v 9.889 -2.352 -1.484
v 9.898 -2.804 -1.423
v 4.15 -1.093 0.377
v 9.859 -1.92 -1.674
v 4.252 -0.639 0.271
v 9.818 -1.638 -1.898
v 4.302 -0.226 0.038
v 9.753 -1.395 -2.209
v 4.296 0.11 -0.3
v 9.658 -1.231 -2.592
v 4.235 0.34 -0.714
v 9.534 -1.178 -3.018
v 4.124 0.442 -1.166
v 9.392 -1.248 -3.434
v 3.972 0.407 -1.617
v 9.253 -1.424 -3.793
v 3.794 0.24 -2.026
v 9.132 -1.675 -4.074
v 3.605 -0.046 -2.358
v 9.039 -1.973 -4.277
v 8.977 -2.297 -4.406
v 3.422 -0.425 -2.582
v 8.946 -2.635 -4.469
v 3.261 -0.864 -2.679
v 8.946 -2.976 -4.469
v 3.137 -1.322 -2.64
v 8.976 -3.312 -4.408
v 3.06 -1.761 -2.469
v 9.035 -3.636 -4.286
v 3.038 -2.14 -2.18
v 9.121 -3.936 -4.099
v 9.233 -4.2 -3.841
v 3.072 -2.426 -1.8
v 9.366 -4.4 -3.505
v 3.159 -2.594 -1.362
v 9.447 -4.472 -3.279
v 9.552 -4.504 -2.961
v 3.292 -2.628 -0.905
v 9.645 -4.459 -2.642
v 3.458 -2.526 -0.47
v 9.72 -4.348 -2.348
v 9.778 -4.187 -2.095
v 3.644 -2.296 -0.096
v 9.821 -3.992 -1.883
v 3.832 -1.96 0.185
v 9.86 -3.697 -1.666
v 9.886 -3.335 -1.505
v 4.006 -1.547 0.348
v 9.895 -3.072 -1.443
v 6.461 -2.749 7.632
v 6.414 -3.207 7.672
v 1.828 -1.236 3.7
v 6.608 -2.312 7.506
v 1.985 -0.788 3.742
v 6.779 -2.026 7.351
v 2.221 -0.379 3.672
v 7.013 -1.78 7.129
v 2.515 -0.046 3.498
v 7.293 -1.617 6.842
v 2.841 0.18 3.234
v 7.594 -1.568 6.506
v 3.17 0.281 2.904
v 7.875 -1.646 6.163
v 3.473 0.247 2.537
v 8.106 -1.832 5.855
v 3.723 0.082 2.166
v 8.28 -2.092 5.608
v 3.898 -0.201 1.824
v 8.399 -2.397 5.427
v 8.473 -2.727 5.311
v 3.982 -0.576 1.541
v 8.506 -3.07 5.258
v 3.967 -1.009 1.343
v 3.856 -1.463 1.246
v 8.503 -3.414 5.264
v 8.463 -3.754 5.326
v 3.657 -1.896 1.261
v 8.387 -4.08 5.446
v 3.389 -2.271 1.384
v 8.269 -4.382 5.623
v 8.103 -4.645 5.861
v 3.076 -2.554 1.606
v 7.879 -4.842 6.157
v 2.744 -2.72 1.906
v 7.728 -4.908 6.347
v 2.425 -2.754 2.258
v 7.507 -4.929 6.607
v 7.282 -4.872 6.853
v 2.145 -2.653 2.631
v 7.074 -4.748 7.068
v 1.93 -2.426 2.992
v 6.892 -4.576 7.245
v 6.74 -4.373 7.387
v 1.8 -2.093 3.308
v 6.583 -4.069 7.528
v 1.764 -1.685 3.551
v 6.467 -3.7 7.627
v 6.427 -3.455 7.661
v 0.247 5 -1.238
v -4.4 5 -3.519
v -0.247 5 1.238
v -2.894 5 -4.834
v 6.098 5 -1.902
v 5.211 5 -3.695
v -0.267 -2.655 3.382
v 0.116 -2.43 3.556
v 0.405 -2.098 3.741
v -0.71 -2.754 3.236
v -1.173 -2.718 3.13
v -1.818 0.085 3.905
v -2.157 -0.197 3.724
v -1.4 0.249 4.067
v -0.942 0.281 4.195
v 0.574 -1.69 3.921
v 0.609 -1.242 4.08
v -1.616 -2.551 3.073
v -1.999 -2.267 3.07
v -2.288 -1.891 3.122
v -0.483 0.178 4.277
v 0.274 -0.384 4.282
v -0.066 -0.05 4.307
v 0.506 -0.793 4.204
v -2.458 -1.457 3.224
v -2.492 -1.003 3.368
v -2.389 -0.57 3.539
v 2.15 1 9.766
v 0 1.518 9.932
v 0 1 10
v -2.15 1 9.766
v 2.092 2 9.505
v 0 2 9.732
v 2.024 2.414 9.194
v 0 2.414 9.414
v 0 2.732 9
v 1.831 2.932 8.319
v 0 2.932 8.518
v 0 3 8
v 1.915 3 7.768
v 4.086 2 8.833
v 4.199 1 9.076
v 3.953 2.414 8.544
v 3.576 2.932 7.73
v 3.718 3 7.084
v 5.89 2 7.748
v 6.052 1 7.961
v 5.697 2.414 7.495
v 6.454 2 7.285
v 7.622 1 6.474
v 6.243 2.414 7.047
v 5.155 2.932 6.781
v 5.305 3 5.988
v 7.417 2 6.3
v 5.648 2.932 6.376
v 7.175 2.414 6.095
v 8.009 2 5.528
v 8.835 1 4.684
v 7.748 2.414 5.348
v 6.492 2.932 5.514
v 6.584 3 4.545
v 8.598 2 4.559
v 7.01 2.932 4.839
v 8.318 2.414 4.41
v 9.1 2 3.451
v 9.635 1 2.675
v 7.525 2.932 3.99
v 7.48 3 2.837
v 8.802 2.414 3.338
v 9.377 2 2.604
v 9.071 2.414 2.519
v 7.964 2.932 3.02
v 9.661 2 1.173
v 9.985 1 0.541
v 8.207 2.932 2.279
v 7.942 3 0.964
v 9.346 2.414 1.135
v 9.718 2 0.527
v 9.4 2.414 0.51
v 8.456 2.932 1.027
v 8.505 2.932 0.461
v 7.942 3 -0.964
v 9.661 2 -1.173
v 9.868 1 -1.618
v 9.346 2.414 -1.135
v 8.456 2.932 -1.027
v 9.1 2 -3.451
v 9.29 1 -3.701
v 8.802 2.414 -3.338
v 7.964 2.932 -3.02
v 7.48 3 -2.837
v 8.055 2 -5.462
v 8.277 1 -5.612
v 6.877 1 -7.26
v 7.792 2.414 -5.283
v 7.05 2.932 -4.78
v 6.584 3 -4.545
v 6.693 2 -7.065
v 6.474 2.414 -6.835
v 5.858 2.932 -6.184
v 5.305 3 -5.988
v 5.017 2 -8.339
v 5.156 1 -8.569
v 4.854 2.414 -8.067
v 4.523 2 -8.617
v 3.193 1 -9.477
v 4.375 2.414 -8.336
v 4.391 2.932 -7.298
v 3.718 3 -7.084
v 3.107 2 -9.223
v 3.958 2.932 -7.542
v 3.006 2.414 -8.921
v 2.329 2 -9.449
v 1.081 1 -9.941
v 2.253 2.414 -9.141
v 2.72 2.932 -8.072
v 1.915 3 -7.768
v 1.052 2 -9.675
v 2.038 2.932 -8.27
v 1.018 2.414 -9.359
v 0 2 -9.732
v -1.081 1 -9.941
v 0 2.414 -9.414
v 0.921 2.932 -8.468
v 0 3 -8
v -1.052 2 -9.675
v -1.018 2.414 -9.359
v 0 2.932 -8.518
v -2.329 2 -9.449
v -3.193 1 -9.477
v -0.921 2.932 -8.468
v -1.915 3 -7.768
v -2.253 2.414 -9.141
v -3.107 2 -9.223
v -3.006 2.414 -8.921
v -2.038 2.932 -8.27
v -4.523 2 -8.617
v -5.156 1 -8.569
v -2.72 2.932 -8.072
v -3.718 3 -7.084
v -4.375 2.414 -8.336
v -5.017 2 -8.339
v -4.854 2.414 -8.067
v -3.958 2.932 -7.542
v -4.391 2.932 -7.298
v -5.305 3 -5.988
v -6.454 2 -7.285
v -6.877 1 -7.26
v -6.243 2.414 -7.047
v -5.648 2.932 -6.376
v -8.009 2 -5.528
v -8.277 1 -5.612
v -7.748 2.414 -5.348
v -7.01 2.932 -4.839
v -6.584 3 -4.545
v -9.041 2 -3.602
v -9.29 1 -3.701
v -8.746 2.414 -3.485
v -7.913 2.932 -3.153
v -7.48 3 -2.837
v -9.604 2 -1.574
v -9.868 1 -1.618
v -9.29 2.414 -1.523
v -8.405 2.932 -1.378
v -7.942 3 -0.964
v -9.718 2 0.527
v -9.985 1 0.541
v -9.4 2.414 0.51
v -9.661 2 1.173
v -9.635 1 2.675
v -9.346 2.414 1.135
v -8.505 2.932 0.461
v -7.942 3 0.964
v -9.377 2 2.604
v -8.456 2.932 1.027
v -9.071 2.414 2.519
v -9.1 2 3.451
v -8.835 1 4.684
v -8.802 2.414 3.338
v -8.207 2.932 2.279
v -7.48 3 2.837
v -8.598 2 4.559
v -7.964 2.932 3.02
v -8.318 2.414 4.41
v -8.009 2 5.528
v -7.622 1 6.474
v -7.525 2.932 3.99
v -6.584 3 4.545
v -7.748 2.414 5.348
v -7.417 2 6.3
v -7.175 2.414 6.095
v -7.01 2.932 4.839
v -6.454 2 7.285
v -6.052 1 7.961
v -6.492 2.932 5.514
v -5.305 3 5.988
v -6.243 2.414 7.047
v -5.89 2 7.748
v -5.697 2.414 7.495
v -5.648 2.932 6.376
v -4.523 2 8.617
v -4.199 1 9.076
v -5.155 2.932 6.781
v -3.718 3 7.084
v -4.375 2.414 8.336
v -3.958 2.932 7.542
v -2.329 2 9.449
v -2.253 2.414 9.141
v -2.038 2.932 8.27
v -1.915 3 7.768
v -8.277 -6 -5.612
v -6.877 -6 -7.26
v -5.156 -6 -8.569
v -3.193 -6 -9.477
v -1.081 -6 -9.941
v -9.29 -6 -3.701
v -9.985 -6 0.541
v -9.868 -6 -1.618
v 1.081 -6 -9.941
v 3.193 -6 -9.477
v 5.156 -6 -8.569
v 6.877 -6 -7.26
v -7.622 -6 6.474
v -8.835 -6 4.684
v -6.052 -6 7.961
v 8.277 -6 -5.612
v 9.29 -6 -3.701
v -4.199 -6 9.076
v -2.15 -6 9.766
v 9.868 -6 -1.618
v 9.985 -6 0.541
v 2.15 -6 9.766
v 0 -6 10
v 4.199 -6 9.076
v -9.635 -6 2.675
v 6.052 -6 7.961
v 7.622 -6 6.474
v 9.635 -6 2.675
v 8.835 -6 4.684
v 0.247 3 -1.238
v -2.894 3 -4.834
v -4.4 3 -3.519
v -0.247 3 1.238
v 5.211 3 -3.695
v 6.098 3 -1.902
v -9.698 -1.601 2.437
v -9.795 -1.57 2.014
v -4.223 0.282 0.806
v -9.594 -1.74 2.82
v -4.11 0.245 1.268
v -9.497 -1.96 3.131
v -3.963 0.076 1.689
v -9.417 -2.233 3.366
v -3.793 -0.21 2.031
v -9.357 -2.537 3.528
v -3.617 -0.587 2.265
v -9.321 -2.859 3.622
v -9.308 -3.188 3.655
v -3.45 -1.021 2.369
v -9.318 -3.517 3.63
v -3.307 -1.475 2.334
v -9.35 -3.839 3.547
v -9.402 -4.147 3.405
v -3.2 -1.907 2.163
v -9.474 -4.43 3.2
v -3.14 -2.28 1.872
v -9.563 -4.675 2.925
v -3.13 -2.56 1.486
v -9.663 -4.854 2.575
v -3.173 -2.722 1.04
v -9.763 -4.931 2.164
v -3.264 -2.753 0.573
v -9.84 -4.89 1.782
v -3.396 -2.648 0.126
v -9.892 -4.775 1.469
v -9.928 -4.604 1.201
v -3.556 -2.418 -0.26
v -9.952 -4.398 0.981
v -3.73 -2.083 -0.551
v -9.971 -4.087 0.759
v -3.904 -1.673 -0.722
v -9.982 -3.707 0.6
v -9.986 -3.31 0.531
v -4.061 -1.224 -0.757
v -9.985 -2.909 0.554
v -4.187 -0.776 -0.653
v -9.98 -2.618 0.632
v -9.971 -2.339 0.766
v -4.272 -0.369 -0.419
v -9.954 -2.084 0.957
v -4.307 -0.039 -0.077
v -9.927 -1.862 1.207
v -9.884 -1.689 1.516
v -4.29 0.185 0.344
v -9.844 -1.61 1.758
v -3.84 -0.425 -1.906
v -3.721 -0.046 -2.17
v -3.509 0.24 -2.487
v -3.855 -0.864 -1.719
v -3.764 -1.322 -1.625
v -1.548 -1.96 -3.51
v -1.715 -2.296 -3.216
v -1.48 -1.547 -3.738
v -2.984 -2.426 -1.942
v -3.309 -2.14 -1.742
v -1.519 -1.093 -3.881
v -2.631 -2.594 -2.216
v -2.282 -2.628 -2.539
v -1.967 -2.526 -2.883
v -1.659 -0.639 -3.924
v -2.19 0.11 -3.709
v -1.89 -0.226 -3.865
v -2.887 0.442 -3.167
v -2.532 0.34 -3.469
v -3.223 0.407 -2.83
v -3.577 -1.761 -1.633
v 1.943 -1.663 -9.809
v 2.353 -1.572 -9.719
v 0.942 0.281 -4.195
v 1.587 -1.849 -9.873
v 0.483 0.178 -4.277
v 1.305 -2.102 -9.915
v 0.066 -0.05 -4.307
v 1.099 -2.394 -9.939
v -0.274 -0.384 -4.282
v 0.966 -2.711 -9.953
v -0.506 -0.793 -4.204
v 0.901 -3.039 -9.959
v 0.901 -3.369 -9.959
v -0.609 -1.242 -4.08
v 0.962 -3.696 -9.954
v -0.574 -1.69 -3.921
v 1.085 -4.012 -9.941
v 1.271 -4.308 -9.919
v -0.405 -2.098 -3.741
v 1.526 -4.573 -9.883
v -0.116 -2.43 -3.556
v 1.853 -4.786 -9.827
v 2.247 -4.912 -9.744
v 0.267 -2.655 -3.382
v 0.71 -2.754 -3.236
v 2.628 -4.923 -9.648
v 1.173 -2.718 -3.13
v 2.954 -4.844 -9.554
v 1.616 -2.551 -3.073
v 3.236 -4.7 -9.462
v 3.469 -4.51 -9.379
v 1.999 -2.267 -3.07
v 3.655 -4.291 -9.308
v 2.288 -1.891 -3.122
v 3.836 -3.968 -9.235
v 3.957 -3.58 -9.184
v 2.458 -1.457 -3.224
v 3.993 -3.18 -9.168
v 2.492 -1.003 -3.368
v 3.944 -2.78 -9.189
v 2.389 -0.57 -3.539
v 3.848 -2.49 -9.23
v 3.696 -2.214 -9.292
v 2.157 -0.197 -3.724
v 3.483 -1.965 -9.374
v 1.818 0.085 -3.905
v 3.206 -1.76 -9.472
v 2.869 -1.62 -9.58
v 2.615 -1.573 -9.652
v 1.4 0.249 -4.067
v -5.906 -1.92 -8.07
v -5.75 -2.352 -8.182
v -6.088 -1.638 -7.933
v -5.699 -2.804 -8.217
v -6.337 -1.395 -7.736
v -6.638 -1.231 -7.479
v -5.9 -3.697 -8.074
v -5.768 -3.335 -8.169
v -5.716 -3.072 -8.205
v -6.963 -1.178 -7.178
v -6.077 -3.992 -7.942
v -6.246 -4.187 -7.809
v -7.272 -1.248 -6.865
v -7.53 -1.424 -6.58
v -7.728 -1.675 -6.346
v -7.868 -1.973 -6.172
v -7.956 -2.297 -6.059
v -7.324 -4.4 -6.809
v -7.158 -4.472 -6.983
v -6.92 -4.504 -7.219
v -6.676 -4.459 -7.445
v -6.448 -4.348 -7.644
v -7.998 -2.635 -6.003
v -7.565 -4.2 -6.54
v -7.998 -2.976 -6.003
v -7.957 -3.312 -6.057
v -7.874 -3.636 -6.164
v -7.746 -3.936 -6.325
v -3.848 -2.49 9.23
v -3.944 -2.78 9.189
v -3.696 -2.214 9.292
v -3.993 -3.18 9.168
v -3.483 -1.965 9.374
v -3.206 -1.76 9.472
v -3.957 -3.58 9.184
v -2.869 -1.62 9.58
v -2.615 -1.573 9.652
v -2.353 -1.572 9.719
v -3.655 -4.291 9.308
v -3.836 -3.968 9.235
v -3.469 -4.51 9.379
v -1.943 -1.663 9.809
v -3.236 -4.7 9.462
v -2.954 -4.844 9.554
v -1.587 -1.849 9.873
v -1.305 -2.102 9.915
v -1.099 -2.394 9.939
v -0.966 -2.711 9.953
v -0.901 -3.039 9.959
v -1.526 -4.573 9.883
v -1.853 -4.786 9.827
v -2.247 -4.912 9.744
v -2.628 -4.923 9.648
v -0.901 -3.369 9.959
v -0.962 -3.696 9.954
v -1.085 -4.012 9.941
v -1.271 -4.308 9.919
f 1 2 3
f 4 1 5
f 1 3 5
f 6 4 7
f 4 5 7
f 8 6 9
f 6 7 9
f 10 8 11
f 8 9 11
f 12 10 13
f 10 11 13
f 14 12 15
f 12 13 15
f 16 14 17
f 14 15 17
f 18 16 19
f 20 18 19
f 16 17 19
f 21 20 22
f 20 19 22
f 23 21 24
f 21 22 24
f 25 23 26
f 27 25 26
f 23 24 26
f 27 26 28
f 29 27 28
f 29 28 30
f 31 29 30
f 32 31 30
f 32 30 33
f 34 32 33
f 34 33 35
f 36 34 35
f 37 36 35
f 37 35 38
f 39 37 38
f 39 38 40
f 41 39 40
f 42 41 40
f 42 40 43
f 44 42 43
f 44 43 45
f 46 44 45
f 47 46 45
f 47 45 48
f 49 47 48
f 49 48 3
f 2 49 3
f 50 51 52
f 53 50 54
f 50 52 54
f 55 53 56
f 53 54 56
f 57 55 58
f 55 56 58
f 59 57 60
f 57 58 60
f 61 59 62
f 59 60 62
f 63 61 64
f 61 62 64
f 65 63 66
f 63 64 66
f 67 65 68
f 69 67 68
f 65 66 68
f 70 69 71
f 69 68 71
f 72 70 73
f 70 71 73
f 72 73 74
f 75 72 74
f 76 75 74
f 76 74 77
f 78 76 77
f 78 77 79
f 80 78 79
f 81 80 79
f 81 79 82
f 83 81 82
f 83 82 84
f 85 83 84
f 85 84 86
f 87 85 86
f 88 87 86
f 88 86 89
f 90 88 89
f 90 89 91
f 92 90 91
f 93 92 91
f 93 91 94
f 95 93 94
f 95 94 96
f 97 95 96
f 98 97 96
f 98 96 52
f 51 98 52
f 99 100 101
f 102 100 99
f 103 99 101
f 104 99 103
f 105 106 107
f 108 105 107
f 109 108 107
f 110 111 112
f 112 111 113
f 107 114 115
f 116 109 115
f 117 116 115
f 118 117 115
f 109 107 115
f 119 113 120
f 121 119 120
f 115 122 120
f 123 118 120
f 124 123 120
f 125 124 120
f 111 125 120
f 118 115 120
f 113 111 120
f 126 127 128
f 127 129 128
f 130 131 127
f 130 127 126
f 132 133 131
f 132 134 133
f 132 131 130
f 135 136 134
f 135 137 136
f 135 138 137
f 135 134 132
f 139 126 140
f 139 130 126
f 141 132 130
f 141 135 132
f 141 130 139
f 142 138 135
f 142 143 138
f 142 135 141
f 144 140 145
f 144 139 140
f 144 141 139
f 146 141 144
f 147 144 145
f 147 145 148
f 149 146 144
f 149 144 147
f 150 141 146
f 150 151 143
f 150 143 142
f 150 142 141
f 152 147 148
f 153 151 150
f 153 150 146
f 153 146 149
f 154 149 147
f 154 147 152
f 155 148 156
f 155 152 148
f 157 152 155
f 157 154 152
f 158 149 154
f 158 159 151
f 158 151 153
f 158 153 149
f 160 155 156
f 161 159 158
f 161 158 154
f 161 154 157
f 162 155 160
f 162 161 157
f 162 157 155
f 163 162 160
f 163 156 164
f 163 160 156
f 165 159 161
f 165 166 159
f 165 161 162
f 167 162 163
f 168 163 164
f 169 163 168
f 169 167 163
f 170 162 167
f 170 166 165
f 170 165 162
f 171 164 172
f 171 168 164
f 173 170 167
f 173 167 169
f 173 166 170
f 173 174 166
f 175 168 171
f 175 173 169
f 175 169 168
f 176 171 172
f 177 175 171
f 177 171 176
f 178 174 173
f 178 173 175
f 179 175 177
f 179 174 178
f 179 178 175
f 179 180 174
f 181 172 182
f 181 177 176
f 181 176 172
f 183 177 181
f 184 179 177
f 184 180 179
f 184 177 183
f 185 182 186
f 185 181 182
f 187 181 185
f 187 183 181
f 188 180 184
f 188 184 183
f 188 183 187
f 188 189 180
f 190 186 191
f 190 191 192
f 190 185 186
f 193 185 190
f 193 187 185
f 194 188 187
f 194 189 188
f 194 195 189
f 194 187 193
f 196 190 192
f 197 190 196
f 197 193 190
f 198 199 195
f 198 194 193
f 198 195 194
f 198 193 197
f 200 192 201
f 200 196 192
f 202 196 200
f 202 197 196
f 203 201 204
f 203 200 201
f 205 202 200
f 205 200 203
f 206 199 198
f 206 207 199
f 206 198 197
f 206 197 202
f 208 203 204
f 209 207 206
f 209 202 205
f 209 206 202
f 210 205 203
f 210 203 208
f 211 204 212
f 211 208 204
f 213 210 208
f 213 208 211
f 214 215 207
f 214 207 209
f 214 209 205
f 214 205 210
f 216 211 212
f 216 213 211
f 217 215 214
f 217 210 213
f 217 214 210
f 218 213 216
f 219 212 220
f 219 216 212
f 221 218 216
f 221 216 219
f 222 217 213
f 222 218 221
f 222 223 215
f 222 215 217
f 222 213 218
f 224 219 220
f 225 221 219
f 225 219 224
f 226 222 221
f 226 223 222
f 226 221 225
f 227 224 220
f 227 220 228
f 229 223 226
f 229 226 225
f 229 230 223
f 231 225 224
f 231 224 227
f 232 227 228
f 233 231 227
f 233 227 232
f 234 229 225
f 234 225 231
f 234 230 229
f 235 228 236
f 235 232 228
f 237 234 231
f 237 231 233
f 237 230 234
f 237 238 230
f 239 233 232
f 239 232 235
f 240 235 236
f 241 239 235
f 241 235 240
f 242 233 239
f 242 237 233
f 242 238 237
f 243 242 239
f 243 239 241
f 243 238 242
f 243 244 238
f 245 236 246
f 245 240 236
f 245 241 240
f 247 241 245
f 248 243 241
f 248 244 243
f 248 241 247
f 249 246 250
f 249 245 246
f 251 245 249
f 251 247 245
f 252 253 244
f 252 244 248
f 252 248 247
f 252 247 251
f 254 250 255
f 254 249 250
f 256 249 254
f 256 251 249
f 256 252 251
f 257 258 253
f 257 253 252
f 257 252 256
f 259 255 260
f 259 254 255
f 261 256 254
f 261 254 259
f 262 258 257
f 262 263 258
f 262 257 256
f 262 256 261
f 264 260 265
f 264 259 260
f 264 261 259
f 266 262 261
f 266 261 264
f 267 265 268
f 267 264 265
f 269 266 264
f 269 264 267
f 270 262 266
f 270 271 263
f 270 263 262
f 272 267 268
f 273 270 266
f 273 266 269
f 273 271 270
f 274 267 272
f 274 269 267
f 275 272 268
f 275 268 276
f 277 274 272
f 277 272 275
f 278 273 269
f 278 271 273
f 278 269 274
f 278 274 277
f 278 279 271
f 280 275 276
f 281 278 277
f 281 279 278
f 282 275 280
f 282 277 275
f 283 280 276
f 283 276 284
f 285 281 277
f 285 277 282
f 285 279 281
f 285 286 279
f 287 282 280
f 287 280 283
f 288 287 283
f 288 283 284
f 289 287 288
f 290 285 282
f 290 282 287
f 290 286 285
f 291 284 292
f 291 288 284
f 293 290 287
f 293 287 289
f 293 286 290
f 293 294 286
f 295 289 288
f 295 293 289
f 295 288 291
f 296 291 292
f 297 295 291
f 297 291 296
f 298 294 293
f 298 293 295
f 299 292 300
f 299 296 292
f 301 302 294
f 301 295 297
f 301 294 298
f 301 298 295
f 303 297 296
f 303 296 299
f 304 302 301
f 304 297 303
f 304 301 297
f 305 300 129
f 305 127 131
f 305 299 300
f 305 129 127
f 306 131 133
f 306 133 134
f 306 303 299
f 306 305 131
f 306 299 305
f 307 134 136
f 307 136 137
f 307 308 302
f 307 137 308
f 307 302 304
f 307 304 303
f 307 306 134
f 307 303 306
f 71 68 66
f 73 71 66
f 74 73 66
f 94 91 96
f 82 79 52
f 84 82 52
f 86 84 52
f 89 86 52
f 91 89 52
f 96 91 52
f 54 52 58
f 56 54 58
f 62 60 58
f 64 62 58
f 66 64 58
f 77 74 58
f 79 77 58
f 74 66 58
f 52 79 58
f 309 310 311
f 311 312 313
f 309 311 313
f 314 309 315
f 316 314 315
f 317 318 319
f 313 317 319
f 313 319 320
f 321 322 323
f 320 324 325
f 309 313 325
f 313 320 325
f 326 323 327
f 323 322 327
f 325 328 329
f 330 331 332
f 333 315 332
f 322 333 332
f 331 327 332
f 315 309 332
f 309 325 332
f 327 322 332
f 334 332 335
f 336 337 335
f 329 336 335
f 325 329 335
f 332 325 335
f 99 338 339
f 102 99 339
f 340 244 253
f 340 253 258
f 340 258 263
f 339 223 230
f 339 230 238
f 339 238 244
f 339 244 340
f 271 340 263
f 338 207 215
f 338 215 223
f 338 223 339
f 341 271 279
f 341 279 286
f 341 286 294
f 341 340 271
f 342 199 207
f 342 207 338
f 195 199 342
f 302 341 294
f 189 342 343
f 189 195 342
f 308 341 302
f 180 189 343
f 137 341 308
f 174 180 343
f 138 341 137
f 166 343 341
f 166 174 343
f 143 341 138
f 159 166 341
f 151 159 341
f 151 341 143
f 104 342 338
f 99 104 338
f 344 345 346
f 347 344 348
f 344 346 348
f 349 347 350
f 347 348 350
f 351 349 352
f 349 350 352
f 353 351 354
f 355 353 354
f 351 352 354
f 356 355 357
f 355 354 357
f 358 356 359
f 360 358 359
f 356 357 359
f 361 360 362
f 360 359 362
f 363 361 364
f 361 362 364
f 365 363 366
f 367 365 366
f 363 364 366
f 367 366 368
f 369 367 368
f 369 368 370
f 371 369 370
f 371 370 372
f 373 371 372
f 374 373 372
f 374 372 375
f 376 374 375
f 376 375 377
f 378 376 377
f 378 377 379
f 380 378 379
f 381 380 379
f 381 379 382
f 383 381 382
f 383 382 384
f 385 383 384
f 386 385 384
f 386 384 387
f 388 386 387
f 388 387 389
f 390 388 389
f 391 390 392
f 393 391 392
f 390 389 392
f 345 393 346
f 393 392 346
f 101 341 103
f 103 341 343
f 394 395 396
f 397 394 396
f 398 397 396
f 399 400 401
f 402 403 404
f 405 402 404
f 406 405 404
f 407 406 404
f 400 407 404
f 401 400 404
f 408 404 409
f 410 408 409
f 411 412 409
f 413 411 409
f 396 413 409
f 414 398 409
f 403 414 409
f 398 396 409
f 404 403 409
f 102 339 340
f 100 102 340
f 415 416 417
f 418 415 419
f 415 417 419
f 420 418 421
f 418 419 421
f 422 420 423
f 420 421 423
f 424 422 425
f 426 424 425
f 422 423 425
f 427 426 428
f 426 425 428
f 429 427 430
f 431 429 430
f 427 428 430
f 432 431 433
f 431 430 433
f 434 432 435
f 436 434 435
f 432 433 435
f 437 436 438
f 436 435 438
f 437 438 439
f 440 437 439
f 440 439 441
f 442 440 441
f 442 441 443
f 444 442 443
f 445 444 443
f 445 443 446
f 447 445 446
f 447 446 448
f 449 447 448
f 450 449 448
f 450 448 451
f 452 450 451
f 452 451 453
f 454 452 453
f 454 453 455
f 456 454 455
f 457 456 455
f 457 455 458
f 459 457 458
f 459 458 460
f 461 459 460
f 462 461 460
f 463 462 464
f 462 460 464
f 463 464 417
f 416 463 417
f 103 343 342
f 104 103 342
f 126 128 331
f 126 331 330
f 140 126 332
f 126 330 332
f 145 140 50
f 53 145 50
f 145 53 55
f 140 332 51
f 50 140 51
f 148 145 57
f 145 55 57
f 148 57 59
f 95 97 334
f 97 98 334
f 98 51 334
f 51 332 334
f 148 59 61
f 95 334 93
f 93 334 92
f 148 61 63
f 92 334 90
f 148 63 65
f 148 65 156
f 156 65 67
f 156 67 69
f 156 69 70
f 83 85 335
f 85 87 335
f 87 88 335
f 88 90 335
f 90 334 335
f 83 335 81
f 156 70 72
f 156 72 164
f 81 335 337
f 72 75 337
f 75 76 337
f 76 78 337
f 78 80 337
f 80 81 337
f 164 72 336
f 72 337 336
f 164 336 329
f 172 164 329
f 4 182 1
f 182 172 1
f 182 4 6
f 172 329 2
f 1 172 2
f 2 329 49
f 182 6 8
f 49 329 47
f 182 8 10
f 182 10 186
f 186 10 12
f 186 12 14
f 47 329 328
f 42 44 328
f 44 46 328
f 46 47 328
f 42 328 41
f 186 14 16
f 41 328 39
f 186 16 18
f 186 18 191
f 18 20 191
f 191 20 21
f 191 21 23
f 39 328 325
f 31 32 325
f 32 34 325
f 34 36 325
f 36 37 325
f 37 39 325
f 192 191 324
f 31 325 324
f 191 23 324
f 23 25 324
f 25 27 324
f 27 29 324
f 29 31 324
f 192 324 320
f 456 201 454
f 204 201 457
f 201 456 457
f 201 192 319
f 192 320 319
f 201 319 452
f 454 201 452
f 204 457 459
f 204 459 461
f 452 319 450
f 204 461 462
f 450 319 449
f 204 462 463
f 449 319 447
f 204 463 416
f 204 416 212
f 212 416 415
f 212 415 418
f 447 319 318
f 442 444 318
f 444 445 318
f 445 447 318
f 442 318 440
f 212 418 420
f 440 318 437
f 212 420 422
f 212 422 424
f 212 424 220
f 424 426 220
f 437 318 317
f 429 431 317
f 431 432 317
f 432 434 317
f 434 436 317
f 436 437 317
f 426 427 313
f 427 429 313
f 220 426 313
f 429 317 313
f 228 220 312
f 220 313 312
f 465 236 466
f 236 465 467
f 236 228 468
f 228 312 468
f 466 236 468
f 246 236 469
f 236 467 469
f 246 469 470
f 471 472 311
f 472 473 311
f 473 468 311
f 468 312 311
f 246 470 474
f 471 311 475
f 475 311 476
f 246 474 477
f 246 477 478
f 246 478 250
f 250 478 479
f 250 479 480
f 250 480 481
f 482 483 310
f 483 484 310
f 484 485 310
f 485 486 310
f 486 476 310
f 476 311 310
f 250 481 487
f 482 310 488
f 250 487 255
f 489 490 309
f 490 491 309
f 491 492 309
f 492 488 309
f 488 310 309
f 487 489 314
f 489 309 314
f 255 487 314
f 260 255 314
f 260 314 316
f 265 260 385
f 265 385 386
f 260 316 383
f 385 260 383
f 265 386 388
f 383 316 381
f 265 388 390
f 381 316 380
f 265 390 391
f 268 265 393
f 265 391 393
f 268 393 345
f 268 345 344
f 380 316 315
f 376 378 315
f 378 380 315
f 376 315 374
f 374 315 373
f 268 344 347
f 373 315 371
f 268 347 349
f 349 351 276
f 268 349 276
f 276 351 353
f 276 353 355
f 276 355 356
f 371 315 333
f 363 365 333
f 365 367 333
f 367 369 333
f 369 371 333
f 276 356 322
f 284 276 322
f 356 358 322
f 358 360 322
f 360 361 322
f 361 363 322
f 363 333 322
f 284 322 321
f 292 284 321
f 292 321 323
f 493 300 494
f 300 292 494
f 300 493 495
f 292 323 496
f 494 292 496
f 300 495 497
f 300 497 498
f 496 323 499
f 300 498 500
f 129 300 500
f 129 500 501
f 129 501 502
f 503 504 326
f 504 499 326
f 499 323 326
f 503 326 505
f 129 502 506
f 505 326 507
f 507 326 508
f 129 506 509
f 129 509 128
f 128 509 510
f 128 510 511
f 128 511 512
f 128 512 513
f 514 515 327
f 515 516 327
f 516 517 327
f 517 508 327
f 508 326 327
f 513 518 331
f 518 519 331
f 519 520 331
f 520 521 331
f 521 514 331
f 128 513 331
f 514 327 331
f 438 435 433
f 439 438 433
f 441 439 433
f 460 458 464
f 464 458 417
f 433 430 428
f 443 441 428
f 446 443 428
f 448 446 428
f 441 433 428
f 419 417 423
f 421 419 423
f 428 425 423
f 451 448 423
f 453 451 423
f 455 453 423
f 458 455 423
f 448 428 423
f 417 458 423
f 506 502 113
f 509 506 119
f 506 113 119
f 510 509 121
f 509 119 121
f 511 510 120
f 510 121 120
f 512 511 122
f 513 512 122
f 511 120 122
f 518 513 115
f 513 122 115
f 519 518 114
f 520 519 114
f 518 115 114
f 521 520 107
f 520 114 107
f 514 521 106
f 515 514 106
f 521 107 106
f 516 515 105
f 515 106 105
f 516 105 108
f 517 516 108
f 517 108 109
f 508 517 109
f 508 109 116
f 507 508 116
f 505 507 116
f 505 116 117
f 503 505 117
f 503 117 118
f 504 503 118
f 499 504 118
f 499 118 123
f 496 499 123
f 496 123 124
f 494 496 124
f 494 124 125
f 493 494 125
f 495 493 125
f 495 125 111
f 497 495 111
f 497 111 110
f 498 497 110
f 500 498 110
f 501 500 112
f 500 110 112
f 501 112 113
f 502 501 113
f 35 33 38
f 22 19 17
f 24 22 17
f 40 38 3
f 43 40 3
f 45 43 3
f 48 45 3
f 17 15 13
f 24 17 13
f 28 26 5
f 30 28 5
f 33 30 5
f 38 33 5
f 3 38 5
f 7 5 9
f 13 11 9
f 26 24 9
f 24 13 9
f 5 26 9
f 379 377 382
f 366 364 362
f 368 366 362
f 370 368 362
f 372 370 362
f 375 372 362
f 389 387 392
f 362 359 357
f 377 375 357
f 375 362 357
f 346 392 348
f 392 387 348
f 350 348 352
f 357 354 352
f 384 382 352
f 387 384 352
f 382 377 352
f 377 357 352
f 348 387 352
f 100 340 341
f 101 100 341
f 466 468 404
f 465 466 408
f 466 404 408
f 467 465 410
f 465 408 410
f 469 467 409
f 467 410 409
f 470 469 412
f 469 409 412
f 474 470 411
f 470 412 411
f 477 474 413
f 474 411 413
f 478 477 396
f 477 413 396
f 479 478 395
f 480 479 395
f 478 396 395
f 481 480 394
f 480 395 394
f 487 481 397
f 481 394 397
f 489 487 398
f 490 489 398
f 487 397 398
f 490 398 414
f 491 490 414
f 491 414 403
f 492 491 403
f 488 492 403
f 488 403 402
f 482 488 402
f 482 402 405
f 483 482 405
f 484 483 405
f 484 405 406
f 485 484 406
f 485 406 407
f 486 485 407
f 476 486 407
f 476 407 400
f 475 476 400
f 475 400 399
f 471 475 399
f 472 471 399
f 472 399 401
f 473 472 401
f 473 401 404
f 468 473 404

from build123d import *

# Parameters (mm, degrees)
BASE_DEPTH          = 3
BASE_DEPTH_BACK     = 6
SKETCH1_R           = 10
SKETCH3_R           = 1.6
HOLE2_DEPTH         = 19.1581212
HOLE2MIRROR_COUNT   = 2
SKETCH4_R           = 1.6
HOLE3_DEPTH         = 19.100993715
SKETCH5_R           = 1.6
CUT_EXTRUDE1_DEPTH  = 19.311666101
SKETCH6_R           = 1.6
CUT_EXTRUDE2_DEPTH  = 19.560472272
SKETCH7_R           = 1.6
CUT_EXTRUDE3_DEPTH  = 19.646604846
FILLET1_R           = 2
EXTRUDE_THIN1_DEPTH = 2


with BuildPart() as part:
    # Sketch1 → base (new, two sides: drawn at the far end of the back side and taken through both)
    with BuildSketch(Plane(origin=(0, 0, 0), x_dir=(1, 0, 0), z_dir=(0, 1, 0)).offset(-BASE_DEPTH_BACK)):
        Circle(SKETCH1_R)
    extrude(amount=BASE_DEPTH + BASE_DEPTH_BACK)

    # Sketch3 → hole2 (cut, through all)
    with BuildSketch(Plane(origin=(-0.941672921, -1.236067977, 3.685836142), x_dir=(-0.9718935871364875, 0.07382318789513377, -0.22354639834264944), z_dir=(0.23541823021467095, 0.3090169943749464, -0.921459035481267))):
        Circle(SKETCH3_R)
    hole2 = extrude(amount=-HOLE2_DEPTH, mode=Mode.SUBTRACT)

    # hole2mirror: hole2 ×2 about axis
    hole2mirror_axis = Axis((0, 5.5, 0), (0, -1, 0))
    for i in range(1, HOLE2MIRROR_COUNT):
        add(hole2.rotate(hole2mirror_axis, i * 360 / HOLE2MIRROR_COUNT), mode=Mode.SUBTRACT)

    # Sketch4 → hole3 (cut, through all)
    with BuildSketch(Plane(origin=(-3.717841, -1.236067977, 0.806098168), x_dir=(-0.19123247894507908, -0.06357892752956036, -0.979483465389136), z_dir=(0.9294602499075393, 0.30901699437494623, -0.20152454200243008))):
        Circle(SKETCH4_R)
    extrude(amount=-HOLE3_DEPTH, mode=Mode.SUBTRACT)

    # Sketch5 → Cut-Extrude1 (cut, through all)
    with BuildSketch(Plane(origin=(3.671965021, -1.093066116, -1.149730122), x_dir=(0.2754858058396647, -0.08200628219437099, 0.9578008876909271), z_dir=(-0.9179912552075574, 0.27326652891267317, 0.2874325304110031))):
        Circle(SKETCH5_R)
    extrude(amount=-CUT_EXTRUDE1_DEPTH, mode=Mode.SUBTRACT)

    # Sketch6 → Cut-Extrude2 (cut, through all)
    with BuildSketch(Plane(origin=(2.875583134, -1.236067977, 2.490613899), x_dir=(-0.5720437997755544, 0.24589274231852376, 0.782497699941298), z_dir=(-0.7188957835464718, 0.30901699437494723, -0.6226534747245682))):
        Circle(SKETCH6_R)
    extrude(amount=-CUT_EXTRUDE2_DEPTH, mode=Mode.SUBTRACT)

    # Sketch7 → Cut-Extrude3 (cut, through all)
    with BuildSketch(Plane(origin=(-2.670502563, -1.093066116, -2.770130417), x_dir=(0.7444971483747472, -0.2450509606833859, -0.6210265877802813), z_dir=(0.6676256406564008, 0.2732665289126714, 0.6925326043690294))):
        Circle(SKETCH7_R)
    extrude(amount=-CUT_EXTRUDE3_DEPTH, mode=Mode.SUBTRACT)

    # Fillet1
    fillet1_edges = [part.edges().sort_by_distance(p)[0] for p in [
        (-10, 3, 0),
    ]]
    fillet(fillet1_edges, radius=FILLET1_R)

    # Sketch9 → Extrude-Thin1 (add)
    with BuildSketch(Plane(origin=(0, 3, 0), x_dir=(1, 0, 0), z_dir=(0, 1, 0))):
        Polygon((-4.40005736, 3.518760981), (-0.246688962, -1.237871846), (6.097894842, 1.902273668), (5.210740629, 3.694746095), (0.246688962, 1.237871846), (-2.893541545, 4.834211512), align=None)
    extrude(amount=EXTRUDE_THIN1_DEPTH)


solid = part.part
